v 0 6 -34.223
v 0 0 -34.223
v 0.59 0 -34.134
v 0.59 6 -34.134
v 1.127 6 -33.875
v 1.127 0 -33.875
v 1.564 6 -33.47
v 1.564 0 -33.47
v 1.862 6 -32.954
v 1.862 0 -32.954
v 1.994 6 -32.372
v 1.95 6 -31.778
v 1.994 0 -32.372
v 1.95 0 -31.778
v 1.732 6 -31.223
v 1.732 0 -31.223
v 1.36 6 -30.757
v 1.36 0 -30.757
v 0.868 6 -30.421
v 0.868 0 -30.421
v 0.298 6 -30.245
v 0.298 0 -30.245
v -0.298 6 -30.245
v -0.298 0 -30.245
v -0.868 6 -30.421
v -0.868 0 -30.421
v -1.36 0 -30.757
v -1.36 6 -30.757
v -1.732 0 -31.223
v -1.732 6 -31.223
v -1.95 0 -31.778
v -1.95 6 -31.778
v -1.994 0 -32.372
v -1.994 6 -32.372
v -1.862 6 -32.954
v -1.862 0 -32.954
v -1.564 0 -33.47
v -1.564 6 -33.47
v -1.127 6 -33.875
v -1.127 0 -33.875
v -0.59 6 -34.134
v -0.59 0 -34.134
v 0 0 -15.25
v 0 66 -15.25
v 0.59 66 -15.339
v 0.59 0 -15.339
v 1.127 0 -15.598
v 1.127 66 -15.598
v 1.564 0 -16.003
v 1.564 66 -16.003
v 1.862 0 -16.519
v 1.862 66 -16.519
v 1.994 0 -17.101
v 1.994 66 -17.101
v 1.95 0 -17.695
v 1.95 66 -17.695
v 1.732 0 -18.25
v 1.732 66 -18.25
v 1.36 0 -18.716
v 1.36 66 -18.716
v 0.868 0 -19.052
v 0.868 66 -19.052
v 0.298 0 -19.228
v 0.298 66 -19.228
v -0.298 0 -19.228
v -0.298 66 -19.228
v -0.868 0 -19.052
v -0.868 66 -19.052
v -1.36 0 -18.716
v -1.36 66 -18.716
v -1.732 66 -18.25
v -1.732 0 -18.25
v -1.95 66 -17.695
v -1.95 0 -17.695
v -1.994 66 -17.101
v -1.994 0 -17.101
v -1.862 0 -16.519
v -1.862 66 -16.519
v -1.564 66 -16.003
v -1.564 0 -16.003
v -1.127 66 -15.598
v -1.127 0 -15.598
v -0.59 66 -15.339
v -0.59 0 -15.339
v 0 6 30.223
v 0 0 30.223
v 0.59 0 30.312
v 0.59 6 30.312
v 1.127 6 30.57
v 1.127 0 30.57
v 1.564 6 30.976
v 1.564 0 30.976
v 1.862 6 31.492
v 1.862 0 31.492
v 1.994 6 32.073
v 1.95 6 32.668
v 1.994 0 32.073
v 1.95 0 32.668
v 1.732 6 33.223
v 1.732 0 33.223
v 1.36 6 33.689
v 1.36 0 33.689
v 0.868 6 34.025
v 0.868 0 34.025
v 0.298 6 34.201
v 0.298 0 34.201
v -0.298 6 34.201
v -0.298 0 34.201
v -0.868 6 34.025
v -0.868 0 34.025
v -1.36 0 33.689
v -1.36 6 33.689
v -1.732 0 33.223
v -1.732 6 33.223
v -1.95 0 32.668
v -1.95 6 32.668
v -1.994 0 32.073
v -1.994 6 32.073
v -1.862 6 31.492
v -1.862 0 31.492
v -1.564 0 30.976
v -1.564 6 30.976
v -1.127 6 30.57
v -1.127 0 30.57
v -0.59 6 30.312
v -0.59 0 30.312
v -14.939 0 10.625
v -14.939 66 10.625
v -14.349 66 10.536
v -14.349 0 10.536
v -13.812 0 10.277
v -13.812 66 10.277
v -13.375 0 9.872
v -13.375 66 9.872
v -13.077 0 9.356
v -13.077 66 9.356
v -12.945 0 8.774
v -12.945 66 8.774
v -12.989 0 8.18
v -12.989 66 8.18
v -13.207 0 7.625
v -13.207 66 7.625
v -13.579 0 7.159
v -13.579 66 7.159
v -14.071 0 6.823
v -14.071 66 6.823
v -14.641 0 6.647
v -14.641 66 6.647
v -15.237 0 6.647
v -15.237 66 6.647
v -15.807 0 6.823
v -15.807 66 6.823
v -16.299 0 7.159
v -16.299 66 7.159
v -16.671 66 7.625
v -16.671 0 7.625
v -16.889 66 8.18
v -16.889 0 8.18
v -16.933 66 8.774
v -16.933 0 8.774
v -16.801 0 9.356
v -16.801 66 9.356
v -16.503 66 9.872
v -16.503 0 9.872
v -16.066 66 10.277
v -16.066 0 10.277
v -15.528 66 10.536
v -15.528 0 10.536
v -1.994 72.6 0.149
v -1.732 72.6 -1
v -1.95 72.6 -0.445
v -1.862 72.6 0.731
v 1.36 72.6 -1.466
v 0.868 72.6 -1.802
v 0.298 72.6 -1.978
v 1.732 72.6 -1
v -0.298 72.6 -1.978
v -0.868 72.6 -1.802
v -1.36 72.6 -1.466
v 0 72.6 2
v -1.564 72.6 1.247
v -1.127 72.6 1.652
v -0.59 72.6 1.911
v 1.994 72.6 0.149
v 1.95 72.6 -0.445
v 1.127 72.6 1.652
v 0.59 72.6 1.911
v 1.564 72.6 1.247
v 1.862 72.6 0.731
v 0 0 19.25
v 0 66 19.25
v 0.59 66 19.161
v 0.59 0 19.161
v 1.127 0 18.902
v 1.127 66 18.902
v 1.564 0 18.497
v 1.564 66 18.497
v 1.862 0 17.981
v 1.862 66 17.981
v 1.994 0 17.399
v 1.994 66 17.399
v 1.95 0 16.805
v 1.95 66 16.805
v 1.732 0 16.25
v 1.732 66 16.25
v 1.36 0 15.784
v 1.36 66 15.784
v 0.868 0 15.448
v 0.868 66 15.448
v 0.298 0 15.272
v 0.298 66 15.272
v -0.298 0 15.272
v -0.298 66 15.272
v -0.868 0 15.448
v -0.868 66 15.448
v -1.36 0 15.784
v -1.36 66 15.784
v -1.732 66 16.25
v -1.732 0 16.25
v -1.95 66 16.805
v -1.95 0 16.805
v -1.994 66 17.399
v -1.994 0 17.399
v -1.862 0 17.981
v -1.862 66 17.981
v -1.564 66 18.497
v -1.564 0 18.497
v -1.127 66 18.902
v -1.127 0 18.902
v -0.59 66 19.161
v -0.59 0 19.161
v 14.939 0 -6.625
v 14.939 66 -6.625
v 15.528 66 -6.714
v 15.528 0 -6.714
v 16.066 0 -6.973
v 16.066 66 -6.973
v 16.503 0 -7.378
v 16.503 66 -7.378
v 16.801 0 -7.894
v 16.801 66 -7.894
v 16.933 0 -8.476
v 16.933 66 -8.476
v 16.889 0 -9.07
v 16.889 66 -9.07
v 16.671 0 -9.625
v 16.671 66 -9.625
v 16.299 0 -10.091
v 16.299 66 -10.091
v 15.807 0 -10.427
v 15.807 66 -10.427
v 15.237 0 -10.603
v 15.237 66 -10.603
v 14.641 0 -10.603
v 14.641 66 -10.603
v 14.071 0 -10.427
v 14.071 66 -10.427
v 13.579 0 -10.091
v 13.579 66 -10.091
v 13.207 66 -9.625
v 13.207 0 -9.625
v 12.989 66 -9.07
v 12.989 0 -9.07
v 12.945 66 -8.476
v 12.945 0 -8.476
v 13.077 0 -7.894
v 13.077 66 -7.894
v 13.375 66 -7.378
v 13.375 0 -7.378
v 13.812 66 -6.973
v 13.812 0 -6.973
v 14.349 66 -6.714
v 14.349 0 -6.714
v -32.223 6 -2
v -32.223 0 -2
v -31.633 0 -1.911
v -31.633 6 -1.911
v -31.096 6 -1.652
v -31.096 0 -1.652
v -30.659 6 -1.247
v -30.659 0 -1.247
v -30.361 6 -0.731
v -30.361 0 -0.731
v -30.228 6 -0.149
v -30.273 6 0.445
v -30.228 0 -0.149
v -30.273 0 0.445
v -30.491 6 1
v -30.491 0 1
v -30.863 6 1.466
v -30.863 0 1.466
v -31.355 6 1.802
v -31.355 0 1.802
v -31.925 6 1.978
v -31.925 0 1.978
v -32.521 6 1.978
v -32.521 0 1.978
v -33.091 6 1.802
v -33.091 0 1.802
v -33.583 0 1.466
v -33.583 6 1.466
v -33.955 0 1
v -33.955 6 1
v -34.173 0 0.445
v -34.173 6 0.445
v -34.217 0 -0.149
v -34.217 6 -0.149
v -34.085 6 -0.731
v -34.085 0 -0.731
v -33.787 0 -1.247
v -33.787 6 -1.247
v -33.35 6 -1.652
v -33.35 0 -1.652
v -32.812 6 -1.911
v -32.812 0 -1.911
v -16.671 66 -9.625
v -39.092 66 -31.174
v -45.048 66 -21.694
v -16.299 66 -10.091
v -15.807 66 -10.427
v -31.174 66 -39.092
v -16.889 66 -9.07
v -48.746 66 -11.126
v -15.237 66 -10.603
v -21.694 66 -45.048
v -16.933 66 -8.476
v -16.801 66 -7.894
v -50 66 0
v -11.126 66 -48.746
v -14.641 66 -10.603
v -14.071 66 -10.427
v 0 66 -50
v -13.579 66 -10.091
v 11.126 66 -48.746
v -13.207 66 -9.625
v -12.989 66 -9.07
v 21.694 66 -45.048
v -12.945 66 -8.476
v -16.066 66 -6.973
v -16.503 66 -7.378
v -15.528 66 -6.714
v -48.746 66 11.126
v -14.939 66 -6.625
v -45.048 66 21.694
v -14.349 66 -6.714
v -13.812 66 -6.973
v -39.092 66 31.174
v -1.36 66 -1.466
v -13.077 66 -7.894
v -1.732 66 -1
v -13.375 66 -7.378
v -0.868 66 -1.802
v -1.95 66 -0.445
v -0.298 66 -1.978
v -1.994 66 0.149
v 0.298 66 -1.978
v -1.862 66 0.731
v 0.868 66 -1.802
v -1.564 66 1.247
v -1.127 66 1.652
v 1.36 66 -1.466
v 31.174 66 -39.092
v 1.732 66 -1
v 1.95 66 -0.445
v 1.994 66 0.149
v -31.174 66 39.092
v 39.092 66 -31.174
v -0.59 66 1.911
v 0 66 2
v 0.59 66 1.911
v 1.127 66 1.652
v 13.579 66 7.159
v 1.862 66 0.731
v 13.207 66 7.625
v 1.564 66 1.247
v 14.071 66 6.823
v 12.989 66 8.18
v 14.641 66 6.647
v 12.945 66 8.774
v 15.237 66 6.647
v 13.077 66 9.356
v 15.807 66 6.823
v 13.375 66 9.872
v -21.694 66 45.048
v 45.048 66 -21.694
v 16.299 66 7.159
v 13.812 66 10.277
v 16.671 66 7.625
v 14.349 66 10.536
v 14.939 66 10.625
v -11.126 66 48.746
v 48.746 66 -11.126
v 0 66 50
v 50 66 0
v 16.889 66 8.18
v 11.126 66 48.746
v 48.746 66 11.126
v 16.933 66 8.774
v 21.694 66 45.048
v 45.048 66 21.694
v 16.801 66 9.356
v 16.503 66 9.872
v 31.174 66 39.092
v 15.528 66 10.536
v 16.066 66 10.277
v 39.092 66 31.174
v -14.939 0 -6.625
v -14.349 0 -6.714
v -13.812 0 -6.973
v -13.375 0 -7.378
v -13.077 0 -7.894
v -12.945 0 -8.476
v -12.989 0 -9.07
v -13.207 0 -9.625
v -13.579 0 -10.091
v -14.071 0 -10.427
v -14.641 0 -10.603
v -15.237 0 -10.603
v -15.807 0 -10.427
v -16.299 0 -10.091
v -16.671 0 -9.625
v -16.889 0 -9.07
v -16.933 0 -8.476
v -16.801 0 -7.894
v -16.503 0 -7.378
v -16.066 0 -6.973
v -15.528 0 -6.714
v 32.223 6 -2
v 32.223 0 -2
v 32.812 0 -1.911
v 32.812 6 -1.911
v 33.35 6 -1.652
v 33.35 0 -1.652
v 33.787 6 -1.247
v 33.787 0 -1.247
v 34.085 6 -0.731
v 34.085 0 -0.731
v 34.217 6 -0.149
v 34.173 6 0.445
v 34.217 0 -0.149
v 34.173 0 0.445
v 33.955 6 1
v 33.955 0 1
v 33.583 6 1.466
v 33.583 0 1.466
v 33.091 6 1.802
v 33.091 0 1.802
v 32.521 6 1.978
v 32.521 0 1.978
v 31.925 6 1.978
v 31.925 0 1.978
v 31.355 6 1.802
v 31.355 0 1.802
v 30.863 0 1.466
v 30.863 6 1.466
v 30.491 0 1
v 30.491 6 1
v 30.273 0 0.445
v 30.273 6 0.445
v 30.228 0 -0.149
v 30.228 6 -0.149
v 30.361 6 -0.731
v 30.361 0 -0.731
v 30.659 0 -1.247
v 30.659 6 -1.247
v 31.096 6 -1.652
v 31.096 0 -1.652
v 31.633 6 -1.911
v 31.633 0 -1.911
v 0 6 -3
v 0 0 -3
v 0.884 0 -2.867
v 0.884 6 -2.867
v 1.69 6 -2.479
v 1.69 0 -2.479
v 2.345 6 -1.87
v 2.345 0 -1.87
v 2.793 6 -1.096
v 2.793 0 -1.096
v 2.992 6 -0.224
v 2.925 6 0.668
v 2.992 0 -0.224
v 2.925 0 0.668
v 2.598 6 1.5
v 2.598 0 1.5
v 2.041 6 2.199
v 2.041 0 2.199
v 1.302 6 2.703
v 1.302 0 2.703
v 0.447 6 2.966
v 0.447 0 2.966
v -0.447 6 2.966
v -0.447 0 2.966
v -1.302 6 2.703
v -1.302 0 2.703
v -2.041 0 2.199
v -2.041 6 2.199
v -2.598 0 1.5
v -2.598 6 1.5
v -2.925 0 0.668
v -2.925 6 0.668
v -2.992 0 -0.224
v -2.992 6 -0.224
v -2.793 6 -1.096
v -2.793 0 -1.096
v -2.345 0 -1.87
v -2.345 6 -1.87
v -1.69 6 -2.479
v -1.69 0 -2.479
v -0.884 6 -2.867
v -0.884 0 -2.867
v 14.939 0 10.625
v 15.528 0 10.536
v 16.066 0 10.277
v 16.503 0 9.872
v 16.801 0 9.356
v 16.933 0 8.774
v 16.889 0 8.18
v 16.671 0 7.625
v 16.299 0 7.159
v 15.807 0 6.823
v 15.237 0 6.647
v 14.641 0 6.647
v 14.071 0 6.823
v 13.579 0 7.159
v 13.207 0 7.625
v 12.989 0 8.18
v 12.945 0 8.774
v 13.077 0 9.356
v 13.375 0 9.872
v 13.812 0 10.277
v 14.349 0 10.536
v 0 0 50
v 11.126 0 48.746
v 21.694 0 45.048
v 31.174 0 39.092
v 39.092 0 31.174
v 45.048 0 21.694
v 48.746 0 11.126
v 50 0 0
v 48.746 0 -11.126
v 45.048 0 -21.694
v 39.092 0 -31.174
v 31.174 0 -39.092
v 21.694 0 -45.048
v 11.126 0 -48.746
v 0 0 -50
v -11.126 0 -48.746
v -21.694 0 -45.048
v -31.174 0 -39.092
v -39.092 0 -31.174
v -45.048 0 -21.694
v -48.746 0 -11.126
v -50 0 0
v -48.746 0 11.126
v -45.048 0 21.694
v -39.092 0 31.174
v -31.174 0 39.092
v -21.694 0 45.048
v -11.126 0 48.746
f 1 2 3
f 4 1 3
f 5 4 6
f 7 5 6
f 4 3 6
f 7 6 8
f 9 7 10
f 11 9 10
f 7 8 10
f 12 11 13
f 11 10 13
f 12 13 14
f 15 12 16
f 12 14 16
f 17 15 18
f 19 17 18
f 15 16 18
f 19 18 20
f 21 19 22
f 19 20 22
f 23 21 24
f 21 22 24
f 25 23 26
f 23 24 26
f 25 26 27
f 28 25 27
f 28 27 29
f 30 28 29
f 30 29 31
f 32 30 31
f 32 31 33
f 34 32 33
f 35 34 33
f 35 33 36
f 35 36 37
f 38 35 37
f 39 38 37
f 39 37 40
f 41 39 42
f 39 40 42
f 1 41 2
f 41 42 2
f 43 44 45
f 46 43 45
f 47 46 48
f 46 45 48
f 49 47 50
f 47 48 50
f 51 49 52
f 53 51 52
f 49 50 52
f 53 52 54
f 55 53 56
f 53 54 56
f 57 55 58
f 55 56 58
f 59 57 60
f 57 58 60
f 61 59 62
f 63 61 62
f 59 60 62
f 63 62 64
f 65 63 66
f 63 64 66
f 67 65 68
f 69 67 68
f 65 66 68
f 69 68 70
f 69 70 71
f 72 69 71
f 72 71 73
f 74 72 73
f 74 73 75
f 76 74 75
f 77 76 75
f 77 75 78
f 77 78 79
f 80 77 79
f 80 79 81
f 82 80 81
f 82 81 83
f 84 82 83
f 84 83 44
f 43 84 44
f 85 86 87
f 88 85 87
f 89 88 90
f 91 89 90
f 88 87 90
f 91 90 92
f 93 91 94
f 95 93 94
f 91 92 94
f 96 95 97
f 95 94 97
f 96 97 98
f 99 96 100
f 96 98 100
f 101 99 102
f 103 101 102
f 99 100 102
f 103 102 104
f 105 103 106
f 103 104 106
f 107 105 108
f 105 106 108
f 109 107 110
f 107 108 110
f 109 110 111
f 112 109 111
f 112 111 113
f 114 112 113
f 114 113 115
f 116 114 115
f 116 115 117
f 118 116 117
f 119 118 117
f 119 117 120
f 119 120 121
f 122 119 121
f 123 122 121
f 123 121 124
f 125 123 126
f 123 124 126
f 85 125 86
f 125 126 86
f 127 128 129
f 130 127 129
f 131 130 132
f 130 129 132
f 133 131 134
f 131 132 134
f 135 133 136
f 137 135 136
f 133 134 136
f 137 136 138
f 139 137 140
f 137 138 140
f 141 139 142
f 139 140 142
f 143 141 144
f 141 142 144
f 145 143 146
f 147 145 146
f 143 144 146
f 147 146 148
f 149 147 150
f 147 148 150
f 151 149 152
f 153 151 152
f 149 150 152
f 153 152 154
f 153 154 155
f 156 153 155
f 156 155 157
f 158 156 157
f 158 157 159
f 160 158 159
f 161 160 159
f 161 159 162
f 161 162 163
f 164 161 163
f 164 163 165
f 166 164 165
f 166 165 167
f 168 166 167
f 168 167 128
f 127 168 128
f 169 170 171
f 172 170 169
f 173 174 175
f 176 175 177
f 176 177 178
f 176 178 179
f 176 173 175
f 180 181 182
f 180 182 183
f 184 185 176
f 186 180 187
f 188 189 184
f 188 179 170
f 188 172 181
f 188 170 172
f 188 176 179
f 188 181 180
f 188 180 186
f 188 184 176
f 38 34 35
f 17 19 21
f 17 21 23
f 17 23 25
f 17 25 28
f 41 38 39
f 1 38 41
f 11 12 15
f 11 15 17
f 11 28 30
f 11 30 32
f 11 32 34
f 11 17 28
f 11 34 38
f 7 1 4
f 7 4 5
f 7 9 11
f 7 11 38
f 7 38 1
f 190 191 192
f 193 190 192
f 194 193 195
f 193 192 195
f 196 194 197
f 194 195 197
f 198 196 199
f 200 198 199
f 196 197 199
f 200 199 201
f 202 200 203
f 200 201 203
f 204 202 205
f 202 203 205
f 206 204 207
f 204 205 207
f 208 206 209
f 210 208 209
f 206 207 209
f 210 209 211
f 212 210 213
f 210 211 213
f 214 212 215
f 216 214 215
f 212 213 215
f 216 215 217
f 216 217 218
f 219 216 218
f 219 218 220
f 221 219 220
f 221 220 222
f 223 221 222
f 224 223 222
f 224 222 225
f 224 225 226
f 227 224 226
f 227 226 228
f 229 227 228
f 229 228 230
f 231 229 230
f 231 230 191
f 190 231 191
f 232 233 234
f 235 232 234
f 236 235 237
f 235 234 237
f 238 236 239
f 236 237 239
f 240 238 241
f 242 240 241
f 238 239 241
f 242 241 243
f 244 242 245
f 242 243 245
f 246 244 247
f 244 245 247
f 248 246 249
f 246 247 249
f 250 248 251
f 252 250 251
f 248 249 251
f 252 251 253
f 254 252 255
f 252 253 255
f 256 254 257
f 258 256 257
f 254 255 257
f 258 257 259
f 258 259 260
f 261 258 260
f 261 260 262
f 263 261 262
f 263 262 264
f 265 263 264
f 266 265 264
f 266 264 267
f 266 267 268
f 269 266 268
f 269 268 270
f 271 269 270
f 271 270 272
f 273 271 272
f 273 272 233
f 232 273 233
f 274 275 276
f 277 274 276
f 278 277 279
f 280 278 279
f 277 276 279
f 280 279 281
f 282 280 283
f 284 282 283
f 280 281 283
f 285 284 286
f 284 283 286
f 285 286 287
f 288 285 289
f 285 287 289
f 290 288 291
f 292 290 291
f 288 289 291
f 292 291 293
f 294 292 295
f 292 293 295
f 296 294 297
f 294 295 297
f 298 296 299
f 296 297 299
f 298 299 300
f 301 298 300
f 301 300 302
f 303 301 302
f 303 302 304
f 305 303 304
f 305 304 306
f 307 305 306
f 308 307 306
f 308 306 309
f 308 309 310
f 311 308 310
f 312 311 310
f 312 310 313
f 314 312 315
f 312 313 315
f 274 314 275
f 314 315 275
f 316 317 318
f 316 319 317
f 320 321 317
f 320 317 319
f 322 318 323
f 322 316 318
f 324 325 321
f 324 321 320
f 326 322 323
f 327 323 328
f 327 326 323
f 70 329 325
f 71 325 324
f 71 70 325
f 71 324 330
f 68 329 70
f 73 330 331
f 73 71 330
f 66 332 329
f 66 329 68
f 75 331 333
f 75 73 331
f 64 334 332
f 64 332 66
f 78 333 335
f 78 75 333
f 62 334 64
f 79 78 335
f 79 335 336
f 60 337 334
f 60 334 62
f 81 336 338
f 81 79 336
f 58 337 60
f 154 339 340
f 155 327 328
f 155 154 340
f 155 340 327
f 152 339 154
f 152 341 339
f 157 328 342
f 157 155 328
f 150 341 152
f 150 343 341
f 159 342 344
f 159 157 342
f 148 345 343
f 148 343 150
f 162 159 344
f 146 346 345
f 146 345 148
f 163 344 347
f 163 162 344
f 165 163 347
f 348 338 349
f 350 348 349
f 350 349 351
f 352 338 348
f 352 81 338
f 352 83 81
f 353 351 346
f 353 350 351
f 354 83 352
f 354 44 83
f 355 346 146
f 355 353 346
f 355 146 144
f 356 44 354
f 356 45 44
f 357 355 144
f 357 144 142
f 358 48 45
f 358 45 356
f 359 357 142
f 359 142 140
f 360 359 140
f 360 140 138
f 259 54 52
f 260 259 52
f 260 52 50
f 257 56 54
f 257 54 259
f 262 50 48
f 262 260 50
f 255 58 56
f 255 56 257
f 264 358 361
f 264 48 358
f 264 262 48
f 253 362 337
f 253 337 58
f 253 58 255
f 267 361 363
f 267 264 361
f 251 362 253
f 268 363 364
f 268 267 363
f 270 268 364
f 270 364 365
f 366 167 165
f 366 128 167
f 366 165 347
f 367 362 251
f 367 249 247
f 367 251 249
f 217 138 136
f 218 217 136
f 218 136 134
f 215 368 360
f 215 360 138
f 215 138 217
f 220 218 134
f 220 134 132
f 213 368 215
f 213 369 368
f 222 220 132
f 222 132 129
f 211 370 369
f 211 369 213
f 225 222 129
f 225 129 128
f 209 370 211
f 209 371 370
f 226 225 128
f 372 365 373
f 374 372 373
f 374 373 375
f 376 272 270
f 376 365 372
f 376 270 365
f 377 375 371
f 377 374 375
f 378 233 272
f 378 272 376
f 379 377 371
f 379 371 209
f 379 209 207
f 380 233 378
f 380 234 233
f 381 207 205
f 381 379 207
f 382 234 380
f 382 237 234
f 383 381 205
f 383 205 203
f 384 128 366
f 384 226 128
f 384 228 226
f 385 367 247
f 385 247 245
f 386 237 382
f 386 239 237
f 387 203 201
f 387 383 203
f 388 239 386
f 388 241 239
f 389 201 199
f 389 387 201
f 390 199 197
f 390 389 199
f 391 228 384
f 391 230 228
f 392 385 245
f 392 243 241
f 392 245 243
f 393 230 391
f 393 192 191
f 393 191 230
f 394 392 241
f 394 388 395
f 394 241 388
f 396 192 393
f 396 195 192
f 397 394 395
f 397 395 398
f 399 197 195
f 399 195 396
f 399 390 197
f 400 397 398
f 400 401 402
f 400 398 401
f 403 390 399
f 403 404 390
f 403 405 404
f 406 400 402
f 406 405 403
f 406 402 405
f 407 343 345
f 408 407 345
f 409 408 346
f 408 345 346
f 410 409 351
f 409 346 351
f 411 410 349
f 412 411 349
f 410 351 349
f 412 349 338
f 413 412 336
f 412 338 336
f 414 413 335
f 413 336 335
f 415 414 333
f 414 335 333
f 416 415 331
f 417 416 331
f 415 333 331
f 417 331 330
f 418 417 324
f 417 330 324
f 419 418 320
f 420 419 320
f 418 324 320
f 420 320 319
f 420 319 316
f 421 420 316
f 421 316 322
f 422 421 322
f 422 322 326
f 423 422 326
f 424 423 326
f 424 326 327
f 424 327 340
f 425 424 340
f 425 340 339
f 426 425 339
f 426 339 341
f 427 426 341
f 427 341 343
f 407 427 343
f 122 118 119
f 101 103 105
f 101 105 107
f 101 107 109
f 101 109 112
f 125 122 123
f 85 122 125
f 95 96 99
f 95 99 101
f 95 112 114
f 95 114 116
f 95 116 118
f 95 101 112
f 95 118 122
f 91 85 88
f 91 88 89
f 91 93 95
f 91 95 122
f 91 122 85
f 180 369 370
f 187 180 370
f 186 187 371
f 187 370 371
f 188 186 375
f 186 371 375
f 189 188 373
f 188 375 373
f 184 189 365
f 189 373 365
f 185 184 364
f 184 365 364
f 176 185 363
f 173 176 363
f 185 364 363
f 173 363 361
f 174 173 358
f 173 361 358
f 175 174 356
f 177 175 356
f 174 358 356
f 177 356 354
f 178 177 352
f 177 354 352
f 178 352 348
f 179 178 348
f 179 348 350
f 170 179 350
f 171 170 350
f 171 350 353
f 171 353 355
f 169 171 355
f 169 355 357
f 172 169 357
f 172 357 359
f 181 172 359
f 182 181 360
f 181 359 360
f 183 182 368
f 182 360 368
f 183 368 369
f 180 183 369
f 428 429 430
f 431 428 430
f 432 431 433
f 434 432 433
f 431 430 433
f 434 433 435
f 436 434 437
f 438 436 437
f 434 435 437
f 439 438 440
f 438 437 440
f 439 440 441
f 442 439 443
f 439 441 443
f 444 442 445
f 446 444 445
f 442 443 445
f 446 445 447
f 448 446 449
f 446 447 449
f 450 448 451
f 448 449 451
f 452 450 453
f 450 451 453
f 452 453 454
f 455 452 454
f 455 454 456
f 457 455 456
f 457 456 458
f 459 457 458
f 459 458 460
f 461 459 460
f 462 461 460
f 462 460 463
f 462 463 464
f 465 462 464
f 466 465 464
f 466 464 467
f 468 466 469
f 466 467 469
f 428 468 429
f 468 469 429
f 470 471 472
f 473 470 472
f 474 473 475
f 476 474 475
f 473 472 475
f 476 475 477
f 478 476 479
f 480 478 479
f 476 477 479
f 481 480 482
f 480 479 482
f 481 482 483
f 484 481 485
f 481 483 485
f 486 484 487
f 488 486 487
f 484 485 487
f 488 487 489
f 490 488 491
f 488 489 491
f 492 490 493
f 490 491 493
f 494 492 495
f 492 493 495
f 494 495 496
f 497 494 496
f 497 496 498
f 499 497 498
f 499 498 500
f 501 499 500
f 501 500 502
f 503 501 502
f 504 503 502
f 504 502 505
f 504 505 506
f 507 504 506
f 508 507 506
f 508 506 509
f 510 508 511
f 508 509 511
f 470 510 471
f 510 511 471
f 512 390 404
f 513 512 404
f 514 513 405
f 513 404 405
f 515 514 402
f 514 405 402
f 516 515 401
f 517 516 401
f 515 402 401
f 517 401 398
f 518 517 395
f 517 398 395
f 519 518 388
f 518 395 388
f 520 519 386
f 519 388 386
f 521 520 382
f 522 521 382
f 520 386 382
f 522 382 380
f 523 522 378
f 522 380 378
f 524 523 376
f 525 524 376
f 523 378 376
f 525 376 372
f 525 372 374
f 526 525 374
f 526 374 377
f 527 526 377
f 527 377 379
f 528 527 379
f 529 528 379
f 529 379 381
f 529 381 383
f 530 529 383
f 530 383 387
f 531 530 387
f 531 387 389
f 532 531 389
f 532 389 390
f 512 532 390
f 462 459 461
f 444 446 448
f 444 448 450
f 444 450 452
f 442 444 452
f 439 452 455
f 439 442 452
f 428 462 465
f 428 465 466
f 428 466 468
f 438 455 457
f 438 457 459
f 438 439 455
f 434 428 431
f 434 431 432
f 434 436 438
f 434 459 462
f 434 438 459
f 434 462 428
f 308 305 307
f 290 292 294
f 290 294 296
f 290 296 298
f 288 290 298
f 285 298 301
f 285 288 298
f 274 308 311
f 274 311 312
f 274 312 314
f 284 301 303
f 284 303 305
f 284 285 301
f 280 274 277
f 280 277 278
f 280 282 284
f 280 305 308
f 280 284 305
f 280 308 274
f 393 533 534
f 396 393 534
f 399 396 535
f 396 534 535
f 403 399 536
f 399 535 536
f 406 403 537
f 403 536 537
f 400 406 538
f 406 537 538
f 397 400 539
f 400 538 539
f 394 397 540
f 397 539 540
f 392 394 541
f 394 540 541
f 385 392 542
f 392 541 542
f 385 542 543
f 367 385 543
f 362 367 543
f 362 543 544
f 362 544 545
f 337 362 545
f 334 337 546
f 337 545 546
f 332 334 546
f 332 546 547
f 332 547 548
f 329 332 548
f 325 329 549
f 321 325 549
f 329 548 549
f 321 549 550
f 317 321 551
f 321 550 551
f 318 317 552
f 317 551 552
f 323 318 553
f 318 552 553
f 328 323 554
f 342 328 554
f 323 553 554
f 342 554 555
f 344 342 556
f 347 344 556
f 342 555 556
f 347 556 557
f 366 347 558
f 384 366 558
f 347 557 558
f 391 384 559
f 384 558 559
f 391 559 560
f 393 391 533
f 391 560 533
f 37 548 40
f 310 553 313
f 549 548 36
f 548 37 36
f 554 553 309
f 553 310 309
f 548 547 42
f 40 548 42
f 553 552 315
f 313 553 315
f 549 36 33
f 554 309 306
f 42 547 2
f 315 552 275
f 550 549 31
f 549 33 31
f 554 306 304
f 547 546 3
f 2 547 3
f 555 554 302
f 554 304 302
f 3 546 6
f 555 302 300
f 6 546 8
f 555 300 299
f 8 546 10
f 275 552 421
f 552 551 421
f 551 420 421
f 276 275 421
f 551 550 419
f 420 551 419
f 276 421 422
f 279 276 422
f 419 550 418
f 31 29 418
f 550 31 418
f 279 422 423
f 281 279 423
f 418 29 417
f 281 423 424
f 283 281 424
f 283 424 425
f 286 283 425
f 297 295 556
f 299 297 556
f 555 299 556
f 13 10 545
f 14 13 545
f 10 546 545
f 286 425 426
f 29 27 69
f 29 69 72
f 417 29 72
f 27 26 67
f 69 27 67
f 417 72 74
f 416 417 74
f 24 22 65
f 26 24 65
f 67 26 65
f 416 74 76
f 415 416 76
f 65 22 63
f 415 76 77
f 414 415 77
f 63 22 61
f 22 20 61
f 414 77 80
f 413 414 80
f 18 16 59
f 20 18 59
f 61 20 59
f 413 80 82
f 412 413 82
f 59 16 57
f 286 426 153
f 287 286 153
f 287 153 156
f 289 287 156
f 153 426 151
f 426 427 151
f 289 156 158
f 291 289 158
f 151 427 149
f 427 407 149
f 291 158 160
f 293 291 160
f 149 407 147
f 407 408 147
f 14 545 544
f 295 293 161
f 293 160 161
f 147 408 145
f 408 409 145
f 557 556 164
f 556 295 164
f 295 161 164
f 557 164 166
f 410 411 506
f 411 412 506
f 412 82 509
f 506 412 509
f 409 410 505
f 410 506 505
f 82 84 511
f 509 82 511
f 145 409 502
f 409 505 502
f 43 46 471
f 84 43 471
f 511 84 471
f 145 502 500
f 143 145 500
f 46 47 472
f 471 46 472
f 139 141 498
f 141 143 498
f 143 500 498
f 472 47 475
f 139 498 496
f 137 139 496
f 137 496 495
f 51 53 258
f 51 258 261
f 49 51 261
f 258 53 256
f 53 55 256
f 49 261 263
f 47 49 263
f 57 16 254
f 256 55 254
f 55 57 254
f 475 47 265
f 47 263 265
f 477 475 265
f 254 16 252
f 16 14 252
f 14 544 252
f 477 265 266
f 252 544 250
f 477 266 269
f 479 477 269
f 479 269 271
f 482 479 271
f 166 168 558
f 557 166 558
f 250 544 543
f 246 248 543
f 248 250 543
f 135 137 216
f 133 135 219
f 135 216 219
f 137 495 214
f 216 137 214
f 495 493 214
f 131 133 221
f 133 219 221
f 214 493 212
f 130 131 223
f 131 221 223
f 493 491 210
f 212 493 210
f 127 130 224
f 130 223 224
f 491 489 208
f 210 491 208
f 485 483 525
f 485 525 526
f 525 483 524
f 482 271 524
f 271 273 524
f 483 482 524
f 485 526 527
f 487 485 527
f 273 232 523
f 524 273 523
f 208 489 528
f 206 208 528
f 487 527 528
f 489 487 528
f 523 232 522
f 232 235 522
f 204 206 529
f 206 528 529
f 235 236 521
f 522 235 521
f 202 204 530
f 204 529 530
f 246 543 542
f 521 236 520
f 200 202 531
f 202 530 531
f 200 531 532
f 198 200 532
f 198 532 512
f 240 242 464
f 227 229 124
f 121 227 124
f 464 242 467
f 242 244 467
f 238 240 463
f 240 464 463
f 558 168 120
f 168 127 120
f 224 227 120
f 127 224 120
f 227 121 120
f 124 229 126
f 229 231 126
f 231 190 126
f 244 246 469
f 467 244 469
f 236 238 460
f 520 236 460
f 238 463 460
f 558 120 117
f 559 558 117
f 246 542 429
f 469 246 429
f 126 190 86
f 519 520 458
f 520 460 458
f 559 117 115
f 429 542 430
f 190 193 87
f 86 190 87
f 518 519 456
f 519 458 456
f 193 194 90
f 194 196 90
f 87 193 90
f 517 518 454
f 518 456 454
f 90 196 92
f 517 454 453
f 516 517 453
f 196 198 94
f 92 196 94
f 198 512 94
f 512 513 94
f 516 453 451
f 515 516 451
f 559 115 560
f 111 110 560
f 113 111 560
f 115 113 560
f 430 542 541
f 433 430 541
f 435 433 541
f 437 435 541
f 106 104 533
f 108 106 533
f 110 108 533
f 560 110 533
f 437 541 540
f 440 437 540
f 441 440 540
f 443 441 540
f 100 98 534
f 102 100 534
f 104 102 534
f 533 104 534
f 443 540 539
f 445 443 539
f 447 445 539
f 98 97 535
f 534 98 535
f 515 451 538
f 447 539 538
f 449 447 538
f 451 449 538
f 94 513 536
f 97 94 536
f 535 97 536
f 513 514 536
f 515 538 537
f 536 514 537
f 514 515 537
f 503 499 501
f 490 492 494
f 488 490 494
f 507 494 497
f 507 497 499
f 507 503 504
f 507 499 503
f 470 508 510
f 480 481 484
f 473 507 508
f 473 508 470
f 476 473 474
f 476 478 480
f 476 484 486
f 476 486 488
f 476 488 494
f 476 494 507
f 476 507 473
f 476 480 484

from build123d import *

# Parameters (mm, degrees)
SKETCH_1_R          = 50
EXTRUDE_1_DEPTH     = 66
SKETCH_2_R          = 2
CUT_EXTRUDE_2_DEPTH = 97.726418315
SKETCH_3_R          = 2
EXTRUDE_2_DEPTH     = 6.6
SKETCH_4_R          = 3
CUT_EXTRUDE_3_DEPTH = 6
SKETCH_8_R          = 2
CUT_EXTRUDE_4_DEPTH = 6


with BuildPart() as part:
    # 草图1 → 凸台-拉伸1 (new body)
    with BuildSketch(Plane(origin=(0, 0, 0), x_dir=(1, 0, 0), z_dir=(0, 1, 0))):
        with Locations(Location((0, 0, 0), (0, 0, 270))):
            Circle(SKETCH_1_R)
    extrude(amount=EXTRUDE_1_DEPTH)

    # 草图2 → 切除-拉伸2 (cut, through all)
    with BuildSketch(Plane(origin=(0, 66, 0), x_dir=(1, 0, 0), z_dir=(0, 1, 0))):
        with Locations(Location((0, 17.25, 0), (0, 0, 270))):
            Circle(SKETCH_2_R)
        with Locations(Location((14.938938215, 8.625, 0), (0, 0, 270))):
            Circle(SKETCH_2_R)
        with Locations(Location((14.938938215, -8.625, 0), (0, 0, 270))):
            Circle(SKETCH_2_R)
        with Locations(Location((0, -17.25, 0), (0, 0, 270))):
            Circle(SKETCH_2_R)
        with Locations(Location((-14.938938215, -8.625, 0), (0, 0, 270))):
            Circle(SKETCH_2_R)
        with Locations(Location((-14.938938215, 8.625, 0), (0, 0, 270))):
            Circle(SKETCH_2_R)
    extrude(amount=-CUT_EXTRUDE_2_DEPTH, mode=Mode.SUBTRACT)

    # 草图3 → 凸台-拉伸2 (add)
    with BuildSketch(Plane(origin=(0, 66, 0), x_dir=(1, 0, 0), z_dir=(0, 1, 0))):
        with Locations(Location((0, 0, 0), (0, 0, 270))):
            Circle(SKETCH_3_R)
    extrude(amount=EXTRUDE_2_DEPTH)

    # 草图4 → 切除-拉伸3 (cut)
    with BuildSketch(Plane(origin=(0, 0, 0), x_dir=(-1, 0, 0), z_dir=(0, -1, 0))):
        with Locations(Location((0, 0, 0), (0, 0, 90))):
            Circle(SKETCH_4_R)
    extrude(amount=-CUT_EXTRUDE_3_DEPTH, mode=Mode.SUBTRACT)

    # 草图8 → 切除-拉伸4 (cut)
    with BuildSketch(Plane(origin=(0, 0, 0), x_dir=(-1, 0, 0), z_dir=(0, -1, 0))):
        with Locations(Location((0, 32.222894459, 0), (0, 0, 90))):
            Circle(SKETCH_8_R)
        with Locations(Location((32.222894459, 0, 0), (0, 0, 90))):
            Circle(SKETCH_8_R)
        with Locations(Location((0, -32.222894459, 0), (0, 0, 90))):
            Circle(SKETCH_8_R)
        with Locations(Location((-32.222894459, 0, 0), (0, 0, 90))):
            Circle(SKETCH_8_R)
    extrude(amount=-CUT_EXTRUDE_4_DEPTH, mode=Mode.SUBTRACT)


solid = part.part
